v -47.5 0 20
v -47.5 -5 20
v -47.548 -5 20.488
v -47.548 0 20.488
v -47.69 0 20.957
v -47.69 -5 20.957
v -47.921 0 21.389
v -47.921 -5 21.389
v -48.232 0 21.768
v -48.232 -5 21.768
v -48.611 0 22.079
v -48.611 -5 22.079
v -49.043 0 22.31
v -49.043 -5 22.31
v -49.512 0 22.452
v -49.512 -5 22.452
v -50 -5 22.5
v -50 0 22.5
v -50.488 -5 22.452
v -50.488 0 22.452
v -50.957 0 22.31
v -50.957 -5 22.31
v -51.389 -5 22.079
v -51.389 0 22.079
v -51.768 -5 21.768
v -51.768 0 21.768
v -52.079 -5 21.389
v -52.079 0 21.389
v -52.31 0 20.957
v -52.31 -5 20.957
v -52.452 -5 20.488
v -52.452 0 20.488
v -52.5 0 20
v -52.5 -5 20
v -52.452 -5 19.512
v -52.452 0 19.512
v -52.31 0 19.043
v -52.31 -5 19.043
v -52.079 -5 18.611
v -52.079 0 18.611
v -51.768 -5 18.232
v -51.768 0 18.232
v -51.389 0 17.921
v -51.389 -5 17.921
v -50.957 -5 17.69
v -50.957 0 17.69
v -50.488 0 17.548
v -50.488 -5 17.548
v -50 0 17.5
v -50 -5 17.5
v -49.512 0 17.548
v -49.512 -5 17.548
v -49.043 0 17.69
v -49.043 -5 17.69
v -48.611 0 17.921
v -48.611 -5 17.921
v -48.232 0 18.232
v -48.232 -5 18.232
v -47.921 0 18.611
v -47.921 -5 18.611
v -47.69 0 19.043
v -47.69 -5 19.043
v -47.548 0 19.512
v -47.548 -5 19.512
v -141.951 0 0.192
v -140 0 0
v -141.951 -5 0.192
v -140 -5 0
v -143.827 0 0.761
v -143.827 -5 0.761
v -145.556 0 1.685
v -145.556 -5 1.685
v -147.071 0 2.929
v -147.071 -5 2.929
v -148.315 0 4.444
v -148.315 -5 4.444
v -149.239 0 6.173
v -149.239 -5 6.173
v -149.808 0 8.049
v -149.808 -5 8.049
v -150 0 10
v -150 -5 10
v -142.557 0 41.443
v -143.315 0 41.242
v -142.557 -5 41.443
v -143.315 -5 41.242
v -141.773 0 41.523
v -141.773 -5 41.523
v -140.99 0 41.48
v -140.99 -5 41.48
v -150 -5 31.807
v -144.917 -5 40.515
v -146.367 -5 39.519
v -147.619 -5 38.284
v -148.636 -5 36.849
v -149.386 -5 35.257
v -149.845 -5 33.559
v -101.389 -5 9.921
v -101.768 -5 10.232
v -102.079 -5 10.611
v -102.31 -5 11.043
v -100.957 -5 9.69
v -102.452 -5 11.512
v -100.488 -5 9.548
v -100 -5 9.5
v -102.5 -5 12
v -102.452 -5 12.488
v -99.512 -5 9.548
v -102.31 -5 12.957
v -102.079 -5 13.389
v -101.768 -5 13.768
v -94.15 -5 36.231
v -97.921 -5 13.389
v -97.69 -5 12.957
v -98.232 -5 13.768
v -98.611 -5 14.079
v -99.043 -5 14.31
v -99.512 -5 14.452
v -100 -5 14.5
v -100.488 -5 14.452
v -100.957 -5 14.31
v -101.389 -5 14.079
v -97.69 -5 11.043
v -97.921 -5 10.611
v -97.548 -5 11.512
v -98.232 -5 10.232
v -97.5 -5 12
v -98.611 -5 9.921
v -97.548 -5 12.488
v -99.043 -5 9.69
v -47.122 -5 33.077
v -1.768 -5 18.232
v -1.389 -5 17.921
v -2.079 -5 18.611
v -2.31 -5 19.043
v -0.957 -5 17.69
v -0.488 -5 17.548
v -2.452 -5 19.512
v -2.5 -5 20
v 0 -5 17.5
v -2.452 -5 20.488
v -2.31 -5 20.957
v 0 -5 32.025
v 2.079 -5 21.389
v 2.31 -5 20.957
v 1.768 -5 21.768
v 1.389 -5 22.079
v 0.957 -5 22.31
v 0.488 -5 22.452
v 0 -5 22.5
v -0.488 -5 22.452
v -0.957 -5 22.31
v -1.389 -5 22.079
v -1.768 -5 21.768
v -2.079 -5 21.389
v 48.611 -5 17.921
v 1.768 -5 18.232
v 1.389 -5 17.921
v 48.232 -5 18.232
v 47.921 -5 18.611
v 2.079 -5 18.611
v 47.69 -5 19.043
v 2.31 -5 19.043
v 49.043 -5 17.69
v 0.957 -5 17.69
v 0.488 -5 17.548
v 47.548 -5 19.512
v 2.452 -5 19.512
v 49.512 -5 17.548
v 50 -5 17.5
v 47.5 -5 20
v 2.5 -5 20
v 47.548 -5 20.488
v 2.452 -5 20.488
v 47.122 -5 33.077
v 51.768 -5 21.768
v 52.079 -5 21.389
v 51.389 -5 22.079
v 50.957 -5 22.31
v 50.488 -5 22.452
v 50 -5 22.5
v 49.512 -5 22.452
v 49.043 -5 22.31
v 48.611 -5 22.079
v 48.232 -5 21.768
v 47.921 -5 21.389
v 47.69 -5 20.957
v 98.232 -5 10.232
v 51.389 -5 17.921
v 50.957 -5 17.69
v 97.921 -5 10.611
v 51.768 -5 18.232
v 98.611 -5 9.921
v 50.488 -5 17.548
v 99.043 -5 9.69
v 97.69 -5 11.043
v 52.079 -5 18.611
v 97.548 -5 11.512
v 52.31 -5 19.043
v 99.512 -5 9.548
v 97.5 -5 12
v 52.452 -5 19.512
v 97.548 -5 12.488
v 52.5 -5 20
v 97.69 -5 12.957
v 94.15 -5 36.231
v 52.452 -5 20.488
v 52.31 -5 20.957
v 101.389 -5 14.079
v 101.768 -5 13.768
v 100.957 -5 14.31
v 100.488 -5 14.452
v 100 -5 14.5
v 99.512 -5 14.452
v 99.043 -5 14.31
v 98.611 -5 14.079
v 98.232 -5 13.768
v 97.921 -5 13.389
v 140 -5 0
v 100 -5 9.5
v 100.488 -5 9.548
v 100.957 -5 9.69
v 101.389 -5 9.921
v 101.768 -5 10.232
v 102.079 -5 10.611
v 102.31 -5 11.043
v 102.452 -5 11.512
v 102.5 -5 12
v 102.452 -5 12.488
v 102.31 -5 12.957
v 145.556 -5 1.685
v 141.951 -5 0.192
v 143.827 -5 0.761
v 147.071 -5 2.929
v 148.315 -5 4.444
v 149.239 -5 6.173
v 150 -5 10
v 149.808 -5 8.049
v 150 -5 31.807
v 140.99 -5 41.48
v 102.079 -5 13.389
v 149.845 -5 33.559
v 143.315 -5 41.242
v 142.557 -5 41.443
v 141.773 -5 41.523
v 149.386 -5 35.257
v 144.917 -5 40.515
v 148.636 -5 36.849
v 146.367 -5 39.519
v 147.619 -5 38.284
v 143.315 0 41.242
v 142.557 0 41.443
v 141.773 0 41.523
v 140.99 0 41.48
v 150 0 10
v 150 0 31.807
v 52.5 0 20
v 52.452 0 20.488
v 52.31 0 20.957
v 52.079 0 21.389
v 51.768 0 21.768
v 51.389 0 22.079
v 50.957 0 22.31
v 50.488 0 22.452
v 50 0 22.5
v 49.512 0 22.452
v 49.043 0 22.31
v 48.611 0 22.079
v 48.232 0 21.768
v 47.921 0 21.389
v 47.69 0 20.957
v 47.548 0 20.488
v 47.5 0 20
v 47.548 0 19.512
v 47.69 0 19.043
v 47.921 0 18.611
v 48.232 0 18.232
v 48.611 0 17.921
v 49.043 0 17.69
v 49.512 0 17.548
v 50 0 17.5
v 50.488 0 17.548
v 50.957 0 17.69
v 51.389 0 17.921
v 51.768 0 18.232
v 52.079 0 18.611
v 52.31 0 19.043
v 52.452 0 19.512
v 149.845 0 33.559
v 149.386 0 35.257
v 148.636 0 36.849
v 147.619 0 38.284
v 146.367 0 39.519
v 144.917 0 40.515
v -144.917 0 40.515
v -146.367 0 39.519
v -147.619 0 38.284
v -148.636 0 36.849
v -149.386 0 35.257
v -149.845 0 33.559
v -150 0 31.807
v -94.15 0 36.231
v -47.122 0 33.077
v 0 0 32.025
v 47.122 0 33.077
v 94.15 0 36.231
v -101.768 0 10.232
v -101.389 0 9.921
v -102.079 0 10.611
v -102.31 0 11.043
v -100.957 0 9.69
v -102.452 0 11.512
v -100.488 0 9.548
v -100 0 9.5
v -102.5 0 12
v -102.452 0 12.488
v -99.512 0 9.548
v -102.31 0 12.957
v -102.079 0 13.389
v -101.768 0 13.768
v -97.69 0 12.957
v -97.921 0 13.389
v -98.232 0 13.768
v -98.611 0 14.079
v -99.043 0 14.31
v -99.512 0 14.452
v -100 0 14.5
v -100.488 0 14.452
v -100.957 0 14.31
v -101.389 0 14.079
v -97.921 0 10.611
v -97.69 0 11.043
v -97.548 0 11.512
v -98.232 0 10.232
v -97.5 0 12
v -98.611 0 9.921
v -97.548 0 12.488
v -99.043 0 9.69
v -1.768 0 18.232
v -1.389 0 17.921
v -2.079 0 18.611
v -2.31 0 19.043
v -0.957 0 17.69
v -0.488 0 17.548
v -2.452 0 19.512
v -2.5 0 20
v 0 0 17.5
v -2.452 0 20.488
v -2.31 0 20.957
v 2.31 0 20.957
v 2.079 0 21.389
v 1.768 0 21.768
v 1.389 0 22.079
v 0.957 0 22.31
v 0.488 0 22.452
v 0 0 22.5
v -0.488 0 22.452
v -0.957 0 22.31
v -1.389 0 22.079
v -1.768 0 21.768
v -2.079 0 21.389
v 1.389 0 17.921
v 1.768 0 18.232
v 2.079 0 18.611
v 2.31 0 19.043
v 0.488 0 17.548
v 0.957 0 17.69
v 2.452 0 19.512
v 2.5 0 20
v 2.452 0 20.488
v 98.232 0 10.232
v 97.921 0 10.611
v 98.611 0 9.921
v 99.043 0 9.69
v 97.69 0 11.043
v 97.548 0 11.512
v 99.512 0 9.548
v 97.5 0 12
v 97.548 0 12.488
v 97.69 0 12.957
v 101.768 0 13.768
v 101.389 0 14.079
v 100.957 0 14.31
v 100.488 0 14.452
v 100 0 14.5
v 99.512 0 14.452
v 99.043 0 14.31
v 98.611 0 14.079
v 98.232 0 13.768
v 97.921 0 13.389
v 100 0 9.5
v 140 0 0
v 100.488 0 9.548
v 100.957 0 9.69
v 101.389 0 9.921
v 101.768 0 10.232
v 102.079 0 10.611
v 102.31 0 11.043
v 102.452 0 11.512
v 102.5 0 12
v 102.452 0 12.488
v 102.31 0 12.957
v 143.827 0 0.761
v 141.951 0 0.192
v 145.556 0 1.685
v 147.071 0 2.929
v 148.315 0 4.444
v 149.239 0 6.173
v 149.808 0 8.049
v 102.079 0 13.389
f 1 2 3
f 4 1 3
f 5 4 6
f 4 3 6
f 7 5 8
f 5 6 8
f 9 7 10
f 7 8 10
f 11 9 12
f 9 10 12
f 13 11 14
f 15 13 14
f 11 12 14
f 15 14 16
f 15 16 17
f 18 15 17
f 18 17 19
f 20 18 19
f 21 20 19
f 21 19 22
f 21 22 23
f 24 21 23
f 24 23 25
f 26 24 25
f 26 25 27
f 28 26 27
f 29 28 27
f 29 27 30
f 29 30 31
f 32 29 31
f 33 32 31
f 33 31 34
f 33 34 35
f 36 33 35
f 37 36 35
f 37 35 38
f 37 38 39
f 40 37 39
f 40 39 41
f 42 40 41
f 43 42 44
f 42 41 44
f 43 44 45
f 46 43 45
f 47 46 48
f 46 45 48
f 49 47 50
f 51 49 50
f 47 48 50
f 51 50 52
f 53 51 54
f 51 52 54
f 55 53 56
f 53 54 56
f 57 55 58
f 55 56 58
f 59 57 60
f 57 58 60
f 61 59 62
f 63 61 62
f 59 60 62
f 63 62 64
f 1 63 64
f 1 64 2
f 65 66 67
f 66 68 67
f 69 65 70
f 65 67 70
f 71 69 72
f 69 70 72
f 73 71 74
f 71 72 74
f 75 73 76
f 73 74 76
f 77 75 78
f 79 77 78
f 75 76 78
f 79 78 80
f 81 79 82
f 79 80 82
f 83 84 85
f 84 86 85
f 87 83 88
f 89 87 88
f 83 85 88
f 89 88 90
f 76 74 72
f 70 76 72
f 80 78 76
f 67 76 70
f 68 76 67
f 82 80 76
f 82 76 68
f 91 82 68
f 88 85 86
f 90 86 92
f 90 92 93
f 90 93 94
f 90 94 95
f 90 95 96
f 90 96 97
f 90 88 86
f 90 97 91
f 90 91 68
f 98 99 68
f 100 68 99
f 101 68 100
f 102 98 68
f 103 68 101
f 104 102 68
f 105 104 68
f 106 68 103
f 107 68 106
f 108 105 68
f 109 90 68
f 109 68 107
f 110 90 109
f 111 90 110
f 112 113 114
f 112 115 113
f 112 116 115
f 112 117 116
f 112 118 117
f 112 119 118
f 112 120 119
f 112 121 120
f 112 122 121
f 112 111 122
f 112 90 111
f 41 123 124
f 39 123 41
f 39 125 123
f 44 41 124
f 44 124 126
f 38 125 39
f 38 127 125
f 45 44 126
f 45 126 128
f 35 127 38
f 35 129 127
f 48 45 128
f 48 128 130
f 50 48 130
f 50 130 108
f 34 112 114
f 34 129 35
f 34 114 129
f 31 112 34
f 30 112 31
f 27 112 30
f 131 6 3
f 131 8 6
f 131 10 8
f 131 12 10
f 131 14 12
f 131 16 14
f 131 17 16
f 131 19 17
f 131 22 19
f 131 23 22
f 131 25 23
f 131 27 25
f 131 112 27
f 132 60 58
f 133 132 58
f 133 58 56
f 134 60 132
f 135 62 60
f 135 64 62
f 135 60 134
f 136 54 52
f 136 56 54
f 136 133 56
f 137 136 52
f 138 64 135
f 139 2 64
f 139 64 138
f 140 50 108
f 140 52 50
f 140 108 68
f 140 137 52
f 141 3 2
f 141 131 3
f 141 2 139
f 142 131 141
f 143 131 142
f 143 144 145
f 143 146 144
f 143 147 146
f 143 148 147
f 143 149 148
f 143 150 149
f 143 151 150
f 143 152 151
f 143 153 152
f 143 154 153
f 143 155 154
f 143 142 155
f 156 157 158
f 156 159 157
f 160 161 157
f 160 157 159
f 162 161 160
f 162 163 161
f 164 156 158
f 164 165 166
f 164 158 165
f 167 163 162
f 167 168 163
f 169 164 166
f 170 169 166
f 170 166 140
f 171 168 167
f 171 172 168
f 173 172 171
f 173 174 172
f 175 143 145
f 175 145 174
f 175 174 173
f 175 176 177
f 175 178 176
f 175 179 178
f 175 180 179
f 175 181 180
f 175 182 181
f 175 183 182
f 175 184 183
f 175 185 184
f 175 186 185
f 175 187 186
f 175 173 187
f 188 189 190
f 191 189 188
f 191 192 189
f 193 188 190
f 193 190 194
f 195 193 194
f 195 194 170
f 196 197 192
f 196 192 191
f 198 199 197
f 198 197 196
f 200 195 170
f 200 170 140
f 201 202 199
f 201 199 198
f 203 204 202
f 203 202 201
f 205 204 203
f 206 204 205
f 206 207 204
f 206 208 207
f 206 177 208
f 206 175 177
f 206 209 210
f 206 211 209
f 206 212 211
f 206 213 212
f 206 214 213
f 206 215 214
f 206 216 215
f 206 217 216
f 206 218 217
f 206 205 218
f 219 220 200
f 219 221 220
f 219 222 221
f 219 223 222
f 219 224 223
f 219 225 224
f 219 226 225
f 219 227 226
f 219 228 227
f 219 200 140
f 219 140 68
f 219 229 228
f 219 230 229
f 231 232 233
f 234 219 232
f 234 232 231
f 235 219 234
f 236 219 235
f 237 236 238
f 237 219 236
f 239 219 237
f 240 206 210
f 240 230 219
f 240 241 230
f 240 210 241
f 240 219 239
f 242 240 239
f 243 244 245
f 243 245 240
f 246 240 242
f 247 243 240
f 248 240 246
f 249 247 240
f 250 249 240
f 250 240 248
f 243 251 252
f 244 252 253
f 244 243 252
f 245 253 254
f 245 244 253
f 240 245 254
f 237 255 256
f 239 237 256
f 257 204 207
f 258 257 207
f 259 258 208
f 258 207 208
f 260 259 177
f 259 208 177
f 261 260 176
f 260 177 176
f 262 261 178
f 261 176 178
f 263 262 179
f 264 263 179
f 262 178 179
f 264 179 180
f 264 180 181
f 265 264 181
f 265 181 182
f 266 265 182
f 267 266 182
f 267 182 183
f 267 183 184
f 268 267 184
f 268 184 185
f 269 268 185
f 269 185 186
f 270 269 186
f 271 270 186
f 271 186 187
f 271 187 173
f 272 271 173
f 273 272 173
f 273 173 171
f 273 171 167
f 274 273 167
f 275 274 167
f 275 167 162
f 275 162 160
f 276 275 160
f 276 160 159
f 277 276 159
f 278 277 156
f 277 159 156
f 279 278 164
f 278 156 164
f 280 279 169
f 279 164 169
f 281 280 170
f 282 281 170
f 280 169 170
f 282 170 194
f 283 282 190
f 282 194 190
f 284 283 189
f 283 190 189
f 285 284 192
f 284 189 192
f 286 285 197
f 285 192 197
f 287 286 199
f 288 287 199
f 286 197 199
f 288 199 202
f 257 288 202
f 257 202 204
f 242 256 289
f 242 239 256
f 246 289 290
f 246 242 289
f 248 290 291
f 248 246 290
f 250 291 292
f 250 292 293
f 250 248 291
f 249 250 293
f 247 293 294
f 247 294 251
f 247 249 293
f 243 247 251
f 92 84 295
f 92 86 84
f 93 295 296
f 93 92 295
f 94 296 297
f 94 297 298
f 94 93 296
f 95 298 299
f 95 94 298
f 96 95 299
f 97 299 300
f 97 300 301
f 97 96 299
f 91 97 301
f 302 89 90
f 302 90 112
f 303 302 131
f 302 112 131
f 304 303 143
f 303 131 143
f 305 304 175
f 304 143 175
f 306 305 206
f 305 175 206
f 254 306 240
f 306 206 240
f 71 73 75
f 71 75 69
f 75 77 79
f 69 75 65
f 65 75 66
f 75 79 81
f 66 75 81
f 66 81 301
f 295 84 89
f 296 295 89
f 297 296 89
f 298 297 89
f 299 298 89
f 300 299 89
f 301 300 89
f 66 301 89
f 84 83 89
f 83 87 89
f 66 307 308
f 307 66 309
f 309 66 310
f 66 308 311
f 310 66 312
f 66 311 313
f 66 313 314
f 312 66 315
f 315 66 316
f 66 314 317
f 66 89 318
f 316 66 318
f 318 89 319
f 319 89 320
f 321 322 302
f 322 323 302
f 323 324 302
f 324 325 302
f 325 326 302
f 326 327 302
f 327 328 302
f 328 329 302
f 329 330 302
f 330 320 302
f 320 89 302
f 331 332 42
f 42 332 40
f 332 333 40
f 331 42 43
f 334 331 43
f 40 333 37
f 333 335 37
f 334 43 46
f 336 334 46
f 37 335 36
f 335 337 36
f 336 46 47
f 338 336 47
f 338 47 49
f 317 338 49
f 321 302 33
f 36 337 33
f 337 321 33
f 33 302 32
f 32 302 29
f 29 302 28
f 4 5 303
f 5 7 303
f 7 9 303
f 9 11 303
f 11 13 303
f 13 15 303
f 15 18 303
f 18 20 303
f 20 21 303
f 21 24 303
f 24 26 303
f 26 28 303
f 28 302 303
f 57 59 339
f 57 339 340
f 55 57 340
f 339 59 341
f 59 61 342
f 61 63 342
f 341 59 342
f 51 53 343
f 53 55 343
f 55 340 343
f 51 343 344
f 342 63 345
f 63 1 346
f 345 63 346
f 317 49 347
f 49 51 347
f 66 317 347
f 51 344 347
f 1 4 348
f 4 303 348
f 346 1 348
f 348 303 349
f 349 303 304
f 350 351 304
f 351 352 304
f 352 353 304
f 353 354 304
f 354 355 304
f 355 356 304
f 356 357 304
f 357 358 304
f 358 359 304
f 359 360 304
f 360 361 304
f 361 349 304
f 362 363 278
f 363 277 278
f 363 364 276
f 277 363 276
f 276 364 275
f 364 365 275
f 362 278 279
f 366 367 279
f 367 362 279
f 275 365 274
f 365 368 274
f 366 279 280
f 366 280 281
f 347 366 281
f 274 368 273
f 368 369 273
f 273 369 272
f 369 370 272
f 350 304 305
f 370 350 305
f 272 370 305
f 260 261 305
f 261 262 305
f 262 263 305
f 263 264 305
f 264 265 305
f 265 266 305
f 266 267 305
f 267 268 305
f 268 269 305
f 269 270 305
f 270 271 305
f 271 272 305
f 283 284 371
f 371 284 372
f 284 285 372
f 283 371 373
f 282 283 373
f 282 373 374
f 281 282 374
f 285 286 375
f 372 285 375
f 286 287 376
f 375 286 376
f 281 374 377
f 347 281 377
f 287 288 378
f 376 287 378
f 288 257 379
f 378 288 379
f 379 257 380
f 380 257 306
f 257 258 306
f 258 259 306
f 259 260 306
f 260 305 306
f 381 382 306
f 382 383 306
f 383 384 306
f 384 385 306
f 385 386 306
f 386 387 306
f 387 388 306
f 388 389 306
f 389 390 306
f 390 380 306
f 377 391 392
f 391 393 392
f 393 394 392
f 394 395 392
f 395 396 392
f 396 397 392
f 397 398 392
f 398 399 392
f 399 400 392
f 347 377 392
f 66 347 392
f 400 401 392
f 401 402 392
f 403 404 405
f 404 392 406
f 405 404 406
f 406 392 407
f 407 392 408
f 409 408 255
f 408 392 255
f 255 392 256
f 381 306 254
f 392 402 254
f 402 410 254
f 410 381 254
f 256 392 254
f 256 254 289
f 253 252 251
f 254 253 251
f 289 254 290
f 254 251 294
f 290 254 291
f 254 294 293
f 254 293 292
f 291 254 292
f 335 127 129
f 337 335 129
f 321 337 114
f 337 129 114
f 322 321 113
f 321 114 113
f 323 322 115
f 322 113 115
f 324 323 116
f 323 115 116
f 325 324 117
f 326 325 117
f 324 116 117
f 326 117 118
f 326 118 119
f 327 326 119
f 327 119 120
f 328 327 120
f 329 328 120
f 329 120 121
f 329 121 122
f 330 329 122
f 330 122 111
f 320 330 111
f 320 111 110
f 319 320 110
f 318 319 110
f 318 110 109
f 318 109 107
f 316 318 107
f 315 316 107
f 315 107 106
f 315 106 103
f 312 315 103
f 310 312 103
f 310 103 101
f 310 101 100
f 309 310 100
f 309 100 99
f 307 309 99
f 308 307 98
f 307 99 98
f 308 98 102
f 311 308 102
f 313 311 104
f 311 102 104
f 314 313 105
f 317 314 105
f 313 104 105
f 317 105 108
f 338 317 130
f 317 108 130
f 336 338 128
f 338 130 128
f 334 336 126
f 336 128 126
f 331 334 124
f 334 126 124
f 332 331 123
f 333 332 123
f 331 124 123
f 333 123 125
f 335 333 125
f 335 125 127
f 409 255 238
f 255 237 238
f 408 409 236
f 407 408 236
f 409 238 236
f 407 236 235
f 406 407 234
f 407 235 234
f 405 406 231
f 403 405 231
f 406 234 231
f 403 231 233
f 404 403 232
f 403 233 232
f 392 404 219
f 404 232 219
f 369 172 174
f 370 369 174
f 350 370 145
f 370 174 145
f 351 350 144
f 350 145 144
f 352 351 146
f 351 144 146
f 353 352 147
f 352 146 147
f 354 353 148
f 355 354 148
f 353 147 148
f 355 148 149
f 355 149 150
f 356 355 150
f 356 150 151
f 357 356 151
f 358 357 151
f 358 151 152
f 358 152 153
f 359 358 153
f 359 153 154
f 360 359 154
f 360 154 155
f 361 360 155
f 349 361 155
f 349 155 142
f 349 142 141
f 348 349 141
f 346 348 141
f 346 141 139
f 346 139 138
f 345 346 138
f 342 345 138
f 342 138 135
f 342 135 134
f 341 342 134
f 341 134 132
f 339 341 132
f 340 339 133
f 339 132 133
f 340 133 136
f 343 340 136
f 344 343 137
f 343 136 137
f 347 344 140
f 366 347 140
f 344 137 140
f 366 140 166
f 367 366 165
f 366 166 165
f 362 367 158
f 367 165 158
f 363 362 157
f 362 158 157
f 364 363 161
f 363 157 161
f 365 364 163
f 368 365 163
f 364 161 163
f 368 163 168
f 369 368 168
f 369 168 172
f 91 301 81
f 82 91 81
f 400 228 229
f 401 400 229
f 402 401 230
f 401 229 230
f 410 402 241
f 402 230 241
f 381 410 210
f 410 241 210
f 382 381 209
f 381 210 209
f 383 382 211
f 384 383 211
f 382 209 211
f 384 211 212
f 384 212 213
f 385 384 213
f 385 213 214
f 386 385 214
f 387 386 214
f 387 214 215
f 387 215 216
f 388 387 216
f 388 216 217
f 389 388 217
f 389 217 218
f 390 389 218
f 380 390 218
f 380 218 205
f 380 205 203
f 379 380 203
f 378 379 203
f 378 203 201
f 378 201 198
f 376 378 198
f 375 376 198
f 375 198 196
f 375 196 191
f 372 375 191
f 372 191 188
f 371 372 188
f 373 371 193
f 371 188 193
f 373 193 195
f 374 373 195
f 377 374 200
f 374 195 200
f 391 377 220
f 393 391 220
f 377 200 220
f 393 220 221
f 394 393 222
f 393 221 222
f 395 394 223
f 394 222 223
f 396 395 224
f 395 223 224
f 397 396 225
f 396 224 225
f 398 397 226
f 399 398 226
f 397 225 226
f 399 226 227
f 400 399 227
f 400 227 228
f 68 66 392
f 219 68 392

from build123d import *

# Parameters (mm, degrees)
F1_DEPTH = 5
F2_R     = 10
F3_R     = 10
F4_R     = 2.5
F5_DEPTH = 25
F6_R     = 2.5
F7_DEPTH = 25
F9_DEPTH = 25
F10_R    = 5


with BuildPart() as f1:
    # F0 (on Front) → F1 (new body)
    with BuildSketch(Plane.XZ):
        with BuildLine():
            Line((-150, 0), (0, 0))
            Line((0, 0), (150, 0))
            Line((150, 0), (150, 40))
            Line((150, 40), (50.331140256, 60))
            ThreePointArc((50.331140256, 60), (25.289442854, 63.7469311095), (0, 65))
            ThreePointArc((0, 65), (-25.289442854, 63.7469311095), (-50.331140256, 60))
            Line((-50.331140256, 60), (-150, 40))
            Line((-150, 40), (-150, 0))
        make_face()
    extrude(amount=F1_DEPTH)

    # F2
    f2_edges = [f1.edges().sort_by_distance(p)[0] for p in [
        (150, -2.5, 40),
        (-150, -2.5, 40),
    ]]
    fillet(f2_edges, radius=F2_R)

    # F3
    f3_edges = [f1.edges().sort_by_distance(p)[0] for p in [
        (-150, -2.5, 0),
        (150, -2.5, 0),
    ]]
    fillet(f3_edges, radius=F3_R)

    # F4 (on face) → F5 (cut)
    with BuildSketch(Plane.XZ.offset(5)):
        with Locations((-50, 20)):
            Circle(F4_R)
        with Locations((50, 20)):
            Circle(F4_R)
        with Locations((0, 20)):
            Circle(F4_R)
    extrude(amount=-F5_DEPTH, mode=Mode.SUBTRACT)

    # F6 (on face) → F7 (cut)
    with BuildSketch(Plane.XZ.offset(5)):
        with Locations((-100, 12)):
            Circle(F6_R)
        with Locations((100, 12)):
            Circle(F6_R)
        with Locations((50, 20)):
            Circle(F6_R)
    extrude(amount=-F7_DEPTH, mode=Mode.SUBTRACT)

    # F8 (on face) → F9 (cut)
    with BuildSketch(Plane.XZ.offset(5)):
        with BuildLine():
            Line((-141.9674253139, 76.700784266), (-141.9674253139, 41.6118524295))
            Line((-141.9674253139, 41.6118524295), (-50.331140256, 60))
            ThreePointArc((-50.331140256, 60), (0, 65), (50.331140256, 60))
            Line((50.331140256, 60), (141.9674253139, 41.6118524295))
            Line((141.9674253139, 41.6118524295), (141.9674253139, 76.700784266))
            Line((141.9674253139, 76.700784266), (-141.9674253139, 76.700784266))
        make_face()
        with BuildLine():
            Line((-50.331140256, 60), (-141.9674253139, 41.6118524295))
            ThreePointArc((-141.9674253139, 41.6118524295), (0, 32.0253701889), (141.9674253139, 41.6118524295))
            Line((141.9674253139, 41.6118524295), (50.331140256, 60))
            ThreePointArc((50.331140256, 60), (0, 65), (-50.331140256, 60))
        make_face()
    extrude(amount=-F9_DEPTH, mode=Mode.SUBTRACT)

    # F10
    f10_edges = [f1.edges().sort_by_distance(p)[0] for p in [
        (-141.967425, -2.5, 41.611852),
        (141.967425, -2.5, 41.611852),
    ]]
    fillet(f10_edges, radius=F10_R)


solid = f1.part
